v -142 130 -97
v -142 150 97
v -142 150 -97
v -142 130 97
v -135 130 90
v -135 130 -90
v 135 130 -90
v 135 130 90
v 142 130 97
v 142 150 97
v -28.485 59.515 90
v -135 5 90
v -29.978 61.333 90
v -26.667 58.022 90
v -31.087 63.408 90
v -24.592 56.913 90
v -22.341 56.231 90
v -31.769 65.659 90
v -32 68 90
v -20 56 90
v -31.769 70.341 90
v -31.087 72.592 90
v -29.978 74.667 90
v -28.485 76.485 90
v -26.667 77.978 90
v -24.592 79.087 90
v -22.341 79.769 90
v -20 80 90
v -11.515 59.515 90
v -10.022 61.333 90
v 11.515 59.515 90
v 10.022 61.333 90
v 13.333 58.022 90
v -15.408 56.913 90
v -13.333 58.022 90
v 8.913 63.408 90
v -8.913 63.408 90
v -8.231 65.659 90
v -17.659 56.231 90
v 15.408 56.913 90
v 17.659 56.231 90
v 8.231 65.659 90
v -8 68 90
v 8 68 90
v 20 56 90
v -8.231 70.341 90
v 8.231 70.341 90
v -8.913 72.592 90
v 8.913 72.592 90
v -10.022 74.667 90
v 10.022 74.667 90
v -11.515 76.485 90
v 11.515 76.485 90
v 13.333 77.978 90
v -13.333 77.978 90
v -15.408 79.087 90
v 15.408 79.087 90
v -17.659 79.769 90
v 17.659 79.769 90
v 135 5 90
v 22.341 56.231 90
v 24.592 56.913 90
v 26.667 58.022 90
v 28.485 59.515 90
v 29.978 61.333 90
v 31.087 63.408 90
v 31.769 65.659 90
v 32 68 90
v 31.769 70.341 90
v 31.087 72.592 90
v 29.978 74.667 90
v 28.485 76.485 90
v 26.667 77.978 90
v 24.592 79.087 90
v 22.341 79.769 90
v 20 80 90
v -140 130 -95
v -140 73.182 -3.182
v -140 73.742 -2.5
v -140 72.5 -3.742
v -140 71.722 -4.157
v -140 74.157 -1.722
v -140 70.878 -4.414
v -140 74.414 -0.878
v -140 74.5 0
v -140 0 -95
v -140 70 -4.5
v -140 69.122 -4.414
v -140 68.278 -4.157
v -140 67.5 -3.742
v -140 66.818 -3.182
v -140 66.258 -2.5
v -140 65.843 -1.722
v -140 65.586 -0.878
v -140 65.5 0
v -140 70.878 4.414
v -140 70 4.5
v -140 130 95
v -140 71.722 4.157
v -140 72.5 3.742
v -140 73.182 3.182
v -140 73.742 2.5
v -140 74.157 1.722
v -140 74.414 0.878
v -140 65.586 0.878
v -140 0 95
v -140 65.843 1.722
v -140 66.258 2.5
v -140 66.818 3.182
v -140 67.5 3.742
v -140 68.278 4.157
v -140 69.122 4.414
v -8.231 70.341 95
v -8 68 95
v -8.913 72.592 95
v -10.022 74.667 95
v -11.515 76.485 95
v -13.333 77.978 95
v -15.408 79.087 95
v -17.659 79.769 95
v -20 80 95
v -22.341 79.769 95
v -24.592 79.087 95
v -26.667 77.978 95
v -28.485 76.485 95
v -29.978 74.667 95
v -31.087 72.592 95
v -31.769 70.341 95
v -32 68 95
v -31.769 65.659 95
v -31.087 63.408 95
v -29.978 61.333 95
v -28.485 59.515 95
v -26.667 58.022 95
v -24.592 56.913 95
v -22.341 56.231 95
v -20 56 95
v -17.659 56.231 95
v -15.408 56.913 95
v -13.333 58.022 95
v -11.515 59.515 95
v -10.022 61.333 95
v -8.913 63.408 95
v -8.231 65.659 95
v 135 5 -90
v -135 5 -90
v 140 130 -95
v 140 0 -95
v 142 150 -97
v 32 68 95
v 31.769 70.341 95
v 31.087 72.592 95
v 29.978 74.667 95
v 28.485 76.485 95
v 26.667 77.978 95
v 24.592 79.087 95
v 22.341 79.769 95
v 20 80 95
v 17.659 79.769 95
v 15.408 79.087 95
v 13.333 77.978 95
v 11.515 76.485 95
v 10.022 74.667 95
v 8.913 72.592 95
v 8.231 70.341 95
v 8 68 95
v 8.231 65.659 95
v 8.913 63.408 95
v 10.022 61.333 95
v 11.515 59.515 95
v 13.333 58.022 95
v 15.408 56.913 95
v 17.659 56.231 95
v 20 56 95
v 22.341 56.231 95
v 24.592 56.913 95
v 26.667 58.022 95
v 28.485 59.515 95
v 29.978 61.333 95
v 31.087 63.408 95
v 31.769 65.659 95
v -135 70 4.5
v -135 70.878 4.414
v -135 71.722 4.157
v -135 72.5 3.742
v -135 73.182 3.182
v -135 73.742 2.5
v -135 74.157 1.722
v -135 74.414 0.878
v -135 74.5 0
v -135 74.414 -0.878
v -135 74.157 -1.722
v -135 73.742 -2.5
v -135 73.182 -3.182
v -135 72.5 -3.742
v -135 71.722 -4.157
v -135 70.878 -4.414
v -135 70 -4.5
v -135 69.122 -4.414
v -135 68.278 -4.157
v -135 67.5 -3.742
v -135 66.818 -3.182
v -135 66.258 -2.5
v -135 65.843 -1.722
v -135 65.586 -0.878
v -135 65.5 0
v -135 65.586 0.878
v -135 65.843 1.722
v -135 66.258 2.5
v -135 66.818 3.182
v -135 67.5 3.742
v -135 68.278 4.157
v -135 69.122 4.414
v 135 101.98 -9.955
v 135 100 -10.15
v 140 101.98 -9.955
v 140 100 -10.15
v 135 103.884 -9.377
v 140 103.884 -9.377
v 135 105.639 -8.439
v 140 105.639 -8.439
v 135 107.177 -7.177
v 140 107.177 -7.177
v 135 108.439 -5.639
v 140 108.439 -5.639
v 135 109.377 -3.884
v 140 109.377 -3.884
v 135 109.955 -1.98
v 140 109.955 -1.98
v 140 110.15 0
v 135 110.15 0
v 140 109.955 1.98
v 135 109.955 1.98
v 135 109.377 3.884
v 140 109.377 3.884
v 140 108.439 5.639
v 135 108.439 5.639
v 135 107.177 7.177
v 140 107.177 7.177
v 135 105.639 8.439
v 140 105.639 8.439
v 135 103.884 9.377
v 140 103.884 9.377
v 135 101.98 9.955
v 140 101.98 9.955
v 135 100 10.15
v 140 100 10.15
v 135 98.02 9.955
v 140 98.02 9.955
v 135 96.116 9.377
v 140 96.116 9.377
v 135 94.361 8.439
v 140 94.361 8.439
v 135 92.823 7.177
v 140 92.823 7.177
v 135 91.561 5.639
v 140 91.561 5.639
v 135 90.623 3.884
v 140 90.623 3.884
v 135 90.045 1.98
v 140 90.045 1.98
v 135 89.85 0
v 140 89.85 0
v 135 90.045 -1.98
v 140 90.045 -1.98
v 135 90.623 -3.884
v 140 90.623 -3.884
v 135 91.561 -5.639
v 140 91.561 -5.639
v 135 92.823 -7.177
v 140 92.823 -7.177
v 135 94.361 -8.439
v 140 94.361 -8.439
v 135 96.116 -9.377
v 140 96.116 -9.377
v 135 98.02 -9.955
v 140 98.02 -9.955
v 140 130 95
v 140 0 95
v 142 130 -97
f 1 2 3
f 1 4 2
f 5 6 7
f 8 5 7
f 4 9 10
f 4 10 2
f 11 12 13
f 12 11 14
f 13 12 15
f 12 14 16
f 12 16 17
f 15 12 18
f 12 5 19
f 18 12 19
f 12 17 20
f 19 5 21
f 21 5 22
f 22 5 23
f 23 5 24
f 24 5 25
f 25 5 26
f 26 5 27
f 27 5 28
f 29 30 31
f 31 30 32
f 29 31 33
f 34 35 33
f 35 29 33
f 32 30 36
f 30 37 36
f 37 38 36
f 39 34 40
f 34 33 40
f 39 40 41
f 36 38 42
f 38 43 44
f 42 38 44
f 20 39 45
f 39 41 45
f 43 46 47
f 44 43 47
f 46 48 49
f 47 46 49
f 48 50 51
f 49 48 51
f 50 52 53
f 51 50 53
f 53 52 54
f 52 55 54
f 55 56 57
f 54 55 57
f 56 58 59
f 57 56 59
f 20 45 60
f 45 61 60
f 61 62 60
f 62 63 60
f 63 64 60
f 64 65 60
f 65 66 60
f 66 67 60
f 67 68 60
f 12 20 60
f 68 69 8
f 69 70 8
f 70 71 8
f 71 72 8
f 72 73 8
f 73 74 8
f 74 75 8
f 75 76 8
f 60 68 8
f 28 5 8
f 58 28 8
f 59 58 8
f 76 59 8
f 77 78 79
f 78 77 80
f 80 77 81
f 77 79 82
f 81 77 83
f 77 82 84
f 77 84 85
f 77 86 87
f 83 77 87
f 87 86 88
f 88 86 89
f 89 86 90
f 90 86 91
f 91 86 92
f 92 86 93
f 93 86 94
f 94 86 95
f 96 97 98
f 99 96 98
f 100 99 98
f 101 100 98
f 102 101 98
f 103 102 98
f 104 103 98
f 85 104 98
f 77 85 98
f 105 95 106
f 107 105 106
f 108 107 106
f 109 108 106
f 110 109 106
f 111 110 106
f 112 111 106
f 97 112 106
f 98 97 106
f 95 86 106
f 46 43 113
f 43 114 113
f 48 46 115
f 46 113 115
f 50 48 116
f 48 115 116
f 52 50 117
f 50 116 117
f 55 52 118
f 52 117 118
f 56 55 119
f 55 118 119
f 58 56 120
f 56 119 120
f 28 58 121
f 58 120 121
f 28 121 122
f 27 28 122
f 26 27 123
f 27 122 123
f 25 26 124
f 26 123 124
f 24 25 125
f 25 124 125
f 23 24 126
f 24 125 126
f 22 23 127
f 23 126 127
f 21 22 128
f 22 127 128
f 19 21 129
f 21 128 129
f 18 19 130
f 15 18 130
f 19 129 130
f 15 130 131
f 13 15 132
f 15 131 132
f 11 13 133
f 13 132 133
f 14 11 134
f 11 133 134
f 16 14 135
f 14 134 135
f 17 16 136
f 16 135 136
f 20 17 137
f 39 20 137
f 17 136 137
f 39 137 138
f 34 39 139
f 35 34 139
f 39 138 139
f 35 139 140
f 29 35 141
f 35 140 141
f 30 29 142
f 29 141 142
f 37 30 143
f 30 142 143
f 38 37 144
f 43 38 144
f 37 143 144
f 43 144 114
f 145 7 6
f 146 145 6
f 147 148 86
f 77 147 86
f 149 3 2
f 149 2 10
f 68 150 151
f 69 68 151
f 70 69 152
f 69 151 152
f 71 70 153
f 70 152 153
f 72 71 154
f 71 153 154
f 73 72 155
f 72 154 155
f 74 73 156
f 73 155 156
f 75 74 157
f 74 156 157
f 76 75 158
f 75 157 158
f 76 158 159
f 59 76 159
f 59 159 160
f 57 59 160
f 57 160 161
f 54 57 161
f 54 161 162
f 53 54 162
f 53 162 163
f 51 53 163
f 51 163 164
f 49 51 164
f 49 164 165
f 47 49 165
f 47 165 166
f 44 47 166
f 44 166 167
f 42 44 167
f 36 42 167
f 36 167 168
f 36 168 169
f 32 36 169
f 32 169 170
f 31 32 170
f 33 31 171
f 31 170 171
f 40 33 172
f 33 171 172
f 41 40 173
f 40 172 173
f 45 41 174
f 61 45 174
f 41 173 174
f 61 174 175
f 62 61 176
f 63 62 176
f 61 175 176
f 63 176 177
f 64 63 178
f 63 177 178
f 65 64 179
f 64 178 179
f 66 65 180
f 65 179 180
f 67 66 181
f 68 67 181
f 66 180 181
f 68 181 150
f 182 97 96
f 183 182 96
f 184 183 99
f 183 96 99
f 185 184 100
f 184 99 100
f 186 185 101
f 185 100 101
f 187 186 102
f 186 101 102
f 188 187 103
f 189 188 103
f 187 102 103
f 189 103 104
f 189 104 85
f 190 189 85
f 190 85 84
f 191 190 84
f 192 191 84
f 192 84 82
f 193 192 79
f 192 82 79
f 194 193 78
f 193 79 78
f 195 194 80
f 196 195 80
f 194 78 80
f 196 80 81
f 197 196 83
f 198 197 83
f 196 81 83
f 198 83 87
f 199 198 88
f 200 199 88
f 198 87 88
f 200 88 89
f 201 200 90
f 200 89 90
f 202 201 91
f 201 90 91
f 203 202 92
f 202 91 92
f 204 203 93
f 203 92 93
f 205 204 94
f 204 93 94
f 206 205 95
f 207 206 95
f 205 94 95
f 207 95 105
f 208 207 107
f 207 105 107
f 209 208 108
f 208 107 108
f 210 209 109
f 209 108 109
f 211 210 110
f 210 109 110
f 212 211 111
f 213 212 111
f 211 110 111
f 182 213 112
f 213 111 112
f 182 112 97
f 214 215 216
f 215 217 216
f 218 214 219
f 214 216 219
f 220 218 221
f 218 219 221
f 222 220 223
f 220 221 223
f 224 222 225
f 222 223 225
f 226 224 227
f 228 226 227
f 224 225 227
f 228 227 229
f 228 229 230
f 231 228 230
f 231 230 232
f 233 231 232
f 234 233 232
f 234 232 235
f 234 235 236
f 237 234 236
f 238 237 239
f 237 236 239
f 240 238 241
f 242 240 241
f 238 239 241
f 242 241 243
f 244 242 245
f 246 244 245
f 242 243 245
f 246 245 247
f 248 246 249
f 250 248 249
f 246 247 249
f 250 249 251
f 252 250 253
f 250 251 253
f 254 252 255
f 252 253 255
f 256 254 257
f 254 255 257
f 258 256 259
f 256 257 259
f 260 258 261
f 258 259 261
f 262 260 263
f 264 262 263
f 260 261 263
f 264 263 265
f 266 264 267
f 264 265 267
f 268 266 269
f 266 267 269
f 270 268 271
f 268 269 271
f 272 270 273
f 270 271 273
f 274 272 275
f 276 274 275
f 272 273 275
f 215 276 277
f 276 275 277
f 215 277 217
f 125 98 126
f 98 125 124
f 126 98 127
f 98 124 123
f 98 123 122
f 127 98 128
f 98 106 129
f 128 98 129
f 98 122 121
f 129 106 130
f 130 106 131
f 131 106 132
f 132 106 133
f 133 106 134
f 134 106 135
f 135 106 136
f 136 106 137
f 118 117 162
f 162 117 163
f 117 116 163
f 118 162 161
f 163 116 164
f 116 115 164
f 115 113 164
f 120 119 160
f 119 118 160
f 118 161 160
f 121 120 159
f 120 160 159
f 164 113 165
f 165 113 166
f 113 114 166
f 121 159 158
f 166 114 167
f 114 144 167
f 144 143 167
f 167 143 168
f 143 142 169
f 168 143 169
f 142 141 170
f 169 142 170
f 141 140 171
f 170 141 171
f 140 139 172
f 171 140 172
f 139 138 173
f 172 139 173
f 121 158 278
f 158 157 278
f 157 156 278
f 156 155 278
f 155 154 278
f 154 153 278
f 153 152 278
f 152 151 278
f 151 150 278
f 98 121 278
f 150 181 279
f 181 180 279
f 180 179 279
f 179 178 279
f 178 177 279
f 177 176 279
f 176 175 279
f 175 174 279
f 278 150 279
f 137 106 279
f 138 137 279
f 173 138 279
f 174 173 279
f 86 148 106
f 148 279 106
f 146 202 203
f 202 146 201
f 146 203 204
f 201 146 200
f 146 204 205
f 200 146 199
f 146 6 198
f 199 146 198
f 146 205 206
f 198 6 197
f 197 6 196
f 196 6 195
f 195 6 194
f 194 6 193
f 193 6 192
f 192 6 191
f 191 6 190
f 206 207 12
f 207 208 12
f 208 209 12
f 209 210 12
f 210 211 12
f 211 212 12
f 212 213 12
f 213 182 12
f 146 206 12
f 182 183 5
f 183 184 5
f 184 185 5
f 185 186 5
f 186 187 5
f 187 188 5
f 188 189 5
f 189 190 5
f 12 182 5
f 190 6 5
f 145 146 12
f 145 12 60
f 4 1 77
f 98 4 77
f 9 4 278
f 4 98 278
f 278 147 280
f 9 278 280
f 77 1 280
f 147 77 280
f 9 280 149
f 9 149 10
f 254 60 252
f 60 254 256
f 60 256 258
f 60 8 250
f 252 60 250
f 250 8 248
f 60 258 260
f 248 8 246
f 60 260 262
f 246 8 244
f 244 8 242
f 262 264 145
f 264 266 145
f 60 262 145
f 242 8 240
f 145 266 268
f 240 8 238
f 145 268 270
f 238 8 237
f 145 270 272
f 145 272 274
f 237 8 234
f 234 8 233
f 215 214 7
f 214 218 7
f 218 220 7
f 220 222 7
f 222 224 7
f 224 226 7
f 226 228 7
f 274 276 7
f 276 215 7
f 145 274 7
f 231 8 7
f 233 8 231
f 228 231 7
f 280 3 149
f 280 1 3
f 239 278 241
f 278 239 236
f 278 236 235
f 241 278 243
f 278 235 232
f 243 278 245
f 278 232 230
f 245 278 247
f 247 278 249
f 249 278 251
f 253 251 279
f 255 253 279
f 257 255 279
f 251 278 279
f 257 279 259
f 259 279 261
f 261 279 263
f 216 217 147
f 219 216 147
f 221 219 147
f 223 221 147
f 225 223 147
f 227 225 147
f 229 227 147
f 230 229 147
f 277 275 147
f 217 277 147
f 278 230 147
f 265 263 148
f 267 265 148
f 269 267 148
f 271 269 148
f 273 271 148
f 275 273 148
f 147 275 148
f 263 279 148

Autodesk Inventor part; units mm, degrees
ref_plane "YZ Plane" through (0, 0, 0) normal (1, 0, 0) x (0, 1, 0)
ref_plane "XZ Plane" through (0, 0, 0) normal (0, 1, 0) x (-1, 0, 0)
ref_plane "XY Plane" through (0, 0, 0) normal (0, 0, 1) x (1, 0, 0)
sketch "Boceto1" plane through (0, 0, 0) normal (0, 1, 0) x (-1, 0, 0)
  line L0 (140, 95) -> (-140, 95)
  line L1 (-140, 95) -> (-140, -95)
  line L2 (-140, -95) -> (140, -95)
  line L3 (140, -95) -> (140, 95)
  point P0 (0, 0)
  dimension "d0" = 280
  dimension "d1" = 190
  dimension "d2" = 95
  dimension "d3" = 140
extrude "Extrusión1" add sketch "Boceto1" along normal blind 130
ref_plane "Plano de trabajo1" through (0, 0, 95) normal (1, 0, 0) x (0, 0, -1)
ref_plane "Plano de trabajo2" through (140, 0, 0) normal (0, 0, -1) x (-1, 0, 0)
sketch "Boceto3" plane through (0, 130, 0) normal (0, 1, 0) x (1, 0, 0)
  line L0 (140, 95) -> (-140, 95) projected
  line L1 (-140, 95) -> (-140, -95) projected
  line L2 (-140, -95) -> (140, -95) projected
  line L3 (140, -95) -> (140, 95) projected
  line L4 (-135, -90) -> (135, -90)
  line L5 (135, -90) -> (135, 90)
  line L6 (135, 90) -> (-135, 90)
  line L7 (-135, 90) -> (-135, -90)
  point P0 (0, 0)
  dimension "d7" = 270
  dimension "d8" = 135
  dimension "d9" = 180
  dimension "d10" = 90
extrude "Extrusión2" cut sketch "Boceto3" against normal blind 125 contours L7 L6 L5 L4
sketch "Boceto4" plane through (-140, 0, -95) normal (-1, 0, 0) x (0, 0, 1)
  circle A0 centre (95, 29.1709) radius 10
  point P0 (95, 0)
  dimension "d13" = 20
extrude "Extrusión3" [suppressed]
sketch "Boceto7" plane through (-140, 0, 95) normal (0, 0, 1) x (1, 0, 0)
  circle A0 centre (140, 68) radius 10
  line L0 (0, 0) -> (280, 0) projected
  line L1 (280, 0) -> (280, 130) projected
  point P0 (140, 0)
  dimension "d18" = 20
  dimension "d19" = 68
  dimension "d20" = 140
extrude "Extrusión5" [suppressed]
sketch "Boceto8" plane through (0, 130, 0) normal (0, 1, 0) x (1, 0, 0)
  line L0 (-142, 97) -> (142, 97)
  line L1 (142, 97) -> (142, -97)
  line L2 (142, -97) -> (-142, -97)
  line L3 (-142, -97) -> (-142, 97)
  line L4 (140, 95) -> (-140, 95) projected
  line L5 (140, -95) -> (140, 95) projected
  line L6 (-140, -95) -> (140, -95) projected
  line L7 (-140, 95) -> (-140, -95) projected
  point P0 (0, 0)
  dimension "d23" = 2
  dimension "d24" = 2
  dimension "d25" = 2
  dimension "d26" = 2
extrude "Techo" add sketch "Boceto8" along normal blind 20 contours L0 L1 L2 L3 | L5 L6 L7 L4
sketch "Boceto9" plane through (-140, 0, 95) normal (0, 0, 1) x (1, 0, 0)
  circle A0 centre (120, 68) radius 12
  circle A1 centre (160, 68) radius 12
  circle A2 centre (140, 68) radius 10 projected
  line L0 (0, 0) -> (280, 0) projected
  line L1 (0, 0) -> (0, 130) projected
  point P0 (140, 0)
  point P1 (148.9, 63.4404)
  point P2 (148.9, 72.5596)
  point P3 (131.1, 63.4404)
  point P4 (131.1, 72.5596)
  dimension "d29" = 24
  dimension "d30" = 24
  dimension "d31" = 68
  dimension "d32" = 40
  dimension "Q" = 120
extrude "Extrusión7" cut sketch "Boceto9" against normal blind 10 contours A0 A2 | A2 A0 | A2 A1 | A1 A2
sketch "Boceto10" plane through (140, 0, 95) normal (1, 0, 0) x (0, 0, -1)
  circle A0 centre (95, 100) radius 10.15
  line L0 (0, 0) -> (0, 130) projected
  line L1 (0, 130) -> (190, 130) projected
  point P0 (95, 0)
  dimension "d36" = 20.3
  dimension "d37" = 95
  dimension "d38" = 30
extrude "Extrusión8" cut sketch "Boceto10" against normal blind 10
sketch "Boceto11" plane through (-140, 0, -95) normal (-1, 0, 0) x (0, 0, 1)
  line L0 (0, 130) -> (190, 130) projected
  circle A0 centre (95, 70) radius 4.5
  line L1 (0, 0) -> (0, 130) projected
  point P0 (95, 0)
  dimension "d45" = 9
  dimension "d46" = 60
  dimension "d47" = 95
extrude "Extrusión10" cut sketch "Boceto11" against normal blind 10
properties part number "cajaEléctrica"
